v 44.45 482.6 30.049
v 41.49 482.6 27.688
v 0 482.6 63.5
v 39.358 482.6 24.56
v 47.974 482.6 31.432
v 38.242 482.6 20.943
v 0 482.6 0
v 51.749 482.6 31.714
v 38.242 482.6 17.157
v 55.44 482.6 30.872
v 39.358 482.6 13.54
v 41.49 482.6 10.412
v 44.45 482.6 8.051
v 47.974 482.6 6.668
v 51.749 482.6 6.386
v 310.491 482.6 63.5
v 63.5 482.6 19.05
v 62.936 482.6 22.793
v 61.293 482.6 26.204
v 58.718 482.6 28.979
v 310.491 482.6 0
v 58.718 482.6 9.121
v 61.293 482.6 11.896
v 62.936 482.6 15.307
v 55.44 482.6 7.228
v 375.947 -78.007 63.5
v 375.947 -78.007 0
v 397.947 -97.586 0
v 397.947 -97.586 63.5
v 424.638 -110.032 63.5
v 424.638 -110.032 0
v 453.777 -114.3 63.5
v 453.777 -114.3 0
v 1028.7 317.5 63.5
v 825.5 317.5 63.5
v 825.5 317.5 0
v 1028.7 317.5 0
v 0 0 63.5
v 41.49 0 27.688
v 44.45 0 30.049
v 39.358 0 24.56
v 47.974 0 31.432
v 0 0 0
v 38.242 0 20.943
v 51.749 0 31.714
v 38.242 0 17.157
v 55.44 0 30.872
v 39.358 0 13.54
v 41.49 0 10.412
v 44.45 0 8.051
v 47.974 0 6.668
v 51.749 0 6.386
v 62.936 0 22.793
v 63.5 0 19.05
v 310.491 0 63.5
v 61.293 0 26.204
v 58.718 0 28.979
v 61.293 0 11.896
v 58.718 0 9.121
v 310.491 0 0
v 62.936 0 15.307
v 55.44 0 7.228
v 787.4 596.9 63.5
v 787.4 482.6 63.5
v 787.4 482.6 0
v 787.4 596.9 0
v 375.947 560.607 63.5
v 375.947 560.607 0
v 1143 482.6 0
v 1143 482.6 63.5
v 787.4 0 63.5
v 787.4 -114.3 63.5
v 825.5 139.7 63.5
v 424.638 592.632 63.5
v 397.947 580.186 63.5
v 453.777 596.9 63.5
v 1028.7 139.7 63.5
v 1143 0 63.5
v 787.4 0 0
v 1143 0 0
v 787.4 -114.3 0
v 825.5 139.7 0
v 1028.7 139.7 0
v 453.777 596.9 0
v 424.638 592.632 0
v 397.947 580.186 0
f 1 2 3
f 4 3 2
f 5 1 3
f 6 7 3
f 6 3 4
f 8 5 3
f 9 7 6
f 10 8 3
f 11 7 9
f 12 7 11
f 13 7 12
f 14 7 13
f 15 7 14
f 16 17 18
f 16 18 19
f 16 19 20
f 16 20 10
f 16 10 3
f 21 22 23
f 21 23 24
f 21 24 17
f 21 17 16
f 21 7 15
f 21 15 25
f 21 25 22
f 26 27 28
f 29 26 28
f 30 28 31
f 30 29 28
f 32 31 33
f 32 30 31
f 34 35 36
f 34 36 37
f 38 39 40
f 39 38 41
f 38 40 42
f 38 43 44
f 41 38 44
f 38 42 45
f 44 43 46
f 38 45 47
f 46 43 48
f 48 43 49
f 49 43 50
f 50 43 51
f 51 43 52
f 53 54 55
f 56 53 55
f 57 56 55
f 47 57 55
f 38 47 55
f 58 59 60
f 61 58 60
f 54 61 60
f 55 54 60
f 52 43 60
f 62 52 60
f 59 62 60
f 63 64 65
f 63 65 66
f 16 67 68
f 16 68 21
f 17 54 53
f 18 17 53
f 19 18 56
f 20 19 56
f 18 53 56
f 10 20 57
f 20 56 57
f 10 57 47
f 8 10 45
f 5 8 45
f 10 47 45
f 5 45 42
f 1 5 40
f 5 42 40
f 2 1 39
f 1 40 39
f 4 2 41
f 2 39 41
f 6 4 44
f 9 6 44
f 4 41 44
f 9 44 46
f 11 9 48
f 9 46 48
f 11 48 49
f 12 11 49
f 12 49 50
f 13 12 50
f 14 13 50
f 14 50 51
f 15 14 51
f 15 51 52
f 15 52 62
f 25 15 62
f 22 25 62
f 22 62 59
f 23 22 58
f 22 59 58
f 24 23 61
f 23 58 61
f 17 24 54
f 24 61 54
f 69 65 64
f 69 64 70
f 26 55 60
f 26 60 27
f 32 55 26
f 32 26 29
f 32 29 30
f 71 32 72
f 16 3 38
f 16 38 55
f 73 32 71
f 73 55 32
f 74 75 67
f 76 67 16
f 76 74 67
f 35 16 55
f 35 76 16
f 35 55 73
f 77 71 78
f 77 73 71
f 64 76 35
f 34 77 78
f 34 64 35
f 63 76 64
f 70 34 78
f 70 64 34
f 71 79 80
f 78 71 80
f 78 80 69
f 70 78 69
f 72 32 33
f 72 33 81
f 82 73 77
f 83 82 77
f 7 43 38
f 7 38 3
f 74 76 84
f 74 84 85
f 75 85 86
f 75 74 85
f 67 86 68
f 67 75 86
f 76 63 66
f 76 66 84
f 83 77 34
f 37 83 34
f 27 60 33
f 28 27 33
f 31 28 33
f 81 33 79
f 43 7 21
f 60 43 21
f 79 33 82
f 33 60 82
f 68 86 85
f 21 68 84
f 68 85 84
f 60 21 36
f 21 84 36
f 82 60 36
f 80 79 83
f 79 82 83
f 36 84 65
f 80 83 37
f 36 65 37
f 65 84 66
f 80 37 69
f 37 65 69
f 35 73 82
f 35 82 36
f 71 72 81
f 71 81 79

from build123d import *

# Parameters (mm, degrees)
F0_W     = 1143
F0_H     = 482.6
F1_DEPTH = 63.5
F2_W     = 203.2
F2_H     = 177.8
F3_DEPTH = 63.5
F4_R     = 12.7
F5_DEPTH = 482.6
F7_DEPTH = 63.5


with BuildPart() as f1:
    # F0 (on Top) → F1 (new body)
    with BuildSketch(Plane.XY):
        with Locations((571.5, 241.3)):
            Rectangle(F0_W, F0_H)
    extrude(amount=F1_DEPTH)

    # F2 (on face) → F3 (cut)
    with BuildSketch(Plane.XY.offset(63.5)):
        with Locations((927.1, 228.6)):
            Rectangle(F2_W, F2_H)
    extrude(amount=-F3_DEPTH, mode=Mode.SUBTRACT)

    # F4 (on face) → F5 (cut, through all)
    with BuildSketch(Plane.XZ):
        with Locations((50.8, 19.05)):
            Circle(F4_R)
    extrude(amount=-F5_DEPTH, mode=Mode.SUBTRACT)

    # F6 (on face) → F7 (join)
    with BuildSketch(Plane.XY.offset(63.5)):
        with BuildLine():
            Line((310.490912, 482.6), (787.4, 482.6))
            Line((787.4, 482.6), (787.4, 596.9))
            Line((787.4, 596.9), (453.776858, 596.9))
            ThreePointArc((453.776858, 596.9), (410.838843, 587.380871), (375.946743, 560.607221))
            Line((375.946743, 560.607221), (310.490912, 482.6))
        make_face()
        with BuildLine():
            Line((787.4, -114.3), (787.4, 0))
            Line((787.4, 0), (310.490912, 0))
            Line((310.490912, 0), (375.946743, -78.007221))
            ThreePointArc((375.946743, -78.007221), (410.838843, -104.780871), (453.776858, -114.3))
            Line((453.776858, -114.3), (787.4, -114.3))
        make_face()
    extrude(amount=-F7_DEPTH)


solid = f1.part
